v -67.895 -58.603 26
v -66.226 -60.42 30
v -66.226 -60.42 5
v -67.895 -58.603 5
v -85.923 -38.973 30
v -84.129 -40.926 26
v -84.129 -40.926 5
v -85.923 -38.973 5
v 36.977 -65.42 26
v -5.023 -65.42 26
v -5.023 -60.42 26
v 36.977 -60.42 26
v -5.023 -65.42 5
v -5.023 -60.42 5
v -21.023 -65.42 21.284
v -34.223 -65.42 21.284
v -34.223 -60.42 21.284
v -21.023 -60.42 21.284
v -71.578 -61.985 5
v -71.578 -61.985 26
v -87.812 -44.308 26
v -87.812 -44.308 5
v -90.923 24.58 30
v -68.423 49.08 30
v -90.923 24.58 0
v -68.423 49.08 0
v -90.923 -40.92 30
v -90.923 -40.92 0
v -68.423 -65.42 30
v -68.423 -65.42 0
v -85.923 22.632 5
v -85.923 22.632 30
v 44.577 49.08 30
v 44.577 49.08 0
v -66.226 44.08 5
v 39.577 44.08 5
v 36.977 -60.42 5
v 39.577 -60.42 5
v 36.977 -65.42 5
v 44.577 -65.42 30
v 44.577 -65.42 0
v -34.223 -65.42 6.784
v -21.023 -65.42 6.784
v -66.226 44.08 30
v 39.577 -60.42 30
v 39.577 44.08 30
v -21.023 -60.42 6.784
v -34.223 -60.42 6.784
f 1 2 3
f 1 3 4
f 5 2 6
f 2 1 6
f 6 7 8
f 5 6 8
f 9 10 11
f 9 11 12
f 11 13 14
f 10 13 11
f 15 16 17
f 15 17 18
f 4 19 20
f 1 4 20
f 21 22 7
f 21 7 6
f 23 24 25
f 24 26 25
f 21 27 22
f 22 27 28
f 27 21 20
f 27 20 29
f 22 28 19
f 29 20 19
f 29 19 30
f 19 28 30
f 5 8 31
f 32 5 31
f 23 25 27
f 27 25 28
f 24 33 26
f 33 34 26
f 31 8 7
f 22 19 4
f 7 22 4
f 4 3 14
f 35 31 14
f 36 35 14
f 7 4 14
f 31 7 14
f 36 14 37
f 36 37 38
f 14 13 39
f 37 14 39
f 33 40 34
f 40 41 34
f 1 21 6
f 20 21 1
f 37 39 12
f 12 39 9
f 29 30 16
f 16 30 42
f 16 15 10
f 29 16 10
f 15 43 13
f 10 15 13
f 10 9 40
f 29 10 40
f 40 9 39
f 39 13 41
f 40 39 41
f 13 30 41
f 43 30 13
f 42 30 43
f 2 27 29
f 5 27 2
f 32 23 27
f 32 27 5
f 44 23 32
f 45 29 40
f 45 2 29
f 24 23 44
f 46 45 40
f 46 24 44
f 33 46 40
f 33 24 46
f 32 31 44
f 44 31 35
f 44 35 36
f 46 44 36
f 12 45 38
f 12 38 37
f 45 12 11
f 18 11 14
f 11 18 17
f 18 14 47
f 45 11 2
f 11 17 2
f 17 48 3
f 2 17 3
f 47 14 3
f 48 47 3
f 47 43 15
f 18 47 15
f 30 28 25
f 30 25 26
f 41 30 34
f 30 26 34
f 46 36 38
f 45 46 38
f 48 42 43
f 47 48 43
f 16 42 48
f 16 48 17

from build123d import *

# Parameters (mm, degrees)
F1_DEPTH = 5
F3_DEPTH = 25
F4_W     = 13.2
F4_H     = 14.5
F4_W_2   = 42
F4_H_2   = 21
F5_DEPTH = 25
F6_W     = 24
F6_H     = 21
F7_DEPTH = 5


with BuildPart() as f1:
    # F0 (on Top) → F1 (new body)
    with BuildSketch(Plane.XY):
        Polygon((44.5768064258, -65.4202470779), (44.5768064258, 49.0797529221), (-68.4231935742, 49.0797529221), (-90.9231935742, 24.5797529221), (-90.9231935742, -40.9202470779), (-68.4231935742, -65.4202470779), align=None)
    extrude(amount=F1_DEPTH)

    # F2 (on face) → F3 (join)
    with BuildSketch(Plane.XY.offset(5)):
        Polygon((-68.4231935742, -65.4202470779), (44.5768064258, -65.4202470779), (44.5768064258, 49.0797529221), (-68.4231935742, 49.0797529221), (-90.9231935742, 24.5797529221), (-90.9231935742, -40.9202470779), align=None)
        Polygon((-85.9231935742, 22.6321763094), (-66.2264395422, 44.0797529221), (39.5768064258, 44.0797529221), (39.5768064258, -60.4202470779), (-66.2264395422, -60.4202470779), (-85.9231935742, -38.9726704653), align=None, mode=Mode.SUBTRACT)
    extrude(amount=F3_DEPTH)

    # F4 (on face) → F5 (cut)
    with BuildSketch(Plane.XZ.offset(65.4202470779)):
        with Locations((-27.6231935742, 14.0335976612)):
            Rectangle(F4_W, F4_H)
        with Locations((15.9768064258, 15.5)):
            Rectangle(F4_W_2, F4_H_2)
    extrude(amount=-F5_DEPTH, mode=Mode.SUBTRACT)

    # F6 (on face) → F7 (cut, through all)
    with BuildSketch(Plane(origin=(-69.7098356481, -64.0192368197, 0), x_dir=(0.6764049996, -0.7365298884, 0), z_dir=(-0.7365298884, -0.6764049996, 0))):
        with Locations((-14.7619176963, 15.5)):
            Rectangle(F6_W, F6_H)
    extrude(amount=-F7_DEPTH, mode=Mode.SUBTRACT)


solid = f1.part
